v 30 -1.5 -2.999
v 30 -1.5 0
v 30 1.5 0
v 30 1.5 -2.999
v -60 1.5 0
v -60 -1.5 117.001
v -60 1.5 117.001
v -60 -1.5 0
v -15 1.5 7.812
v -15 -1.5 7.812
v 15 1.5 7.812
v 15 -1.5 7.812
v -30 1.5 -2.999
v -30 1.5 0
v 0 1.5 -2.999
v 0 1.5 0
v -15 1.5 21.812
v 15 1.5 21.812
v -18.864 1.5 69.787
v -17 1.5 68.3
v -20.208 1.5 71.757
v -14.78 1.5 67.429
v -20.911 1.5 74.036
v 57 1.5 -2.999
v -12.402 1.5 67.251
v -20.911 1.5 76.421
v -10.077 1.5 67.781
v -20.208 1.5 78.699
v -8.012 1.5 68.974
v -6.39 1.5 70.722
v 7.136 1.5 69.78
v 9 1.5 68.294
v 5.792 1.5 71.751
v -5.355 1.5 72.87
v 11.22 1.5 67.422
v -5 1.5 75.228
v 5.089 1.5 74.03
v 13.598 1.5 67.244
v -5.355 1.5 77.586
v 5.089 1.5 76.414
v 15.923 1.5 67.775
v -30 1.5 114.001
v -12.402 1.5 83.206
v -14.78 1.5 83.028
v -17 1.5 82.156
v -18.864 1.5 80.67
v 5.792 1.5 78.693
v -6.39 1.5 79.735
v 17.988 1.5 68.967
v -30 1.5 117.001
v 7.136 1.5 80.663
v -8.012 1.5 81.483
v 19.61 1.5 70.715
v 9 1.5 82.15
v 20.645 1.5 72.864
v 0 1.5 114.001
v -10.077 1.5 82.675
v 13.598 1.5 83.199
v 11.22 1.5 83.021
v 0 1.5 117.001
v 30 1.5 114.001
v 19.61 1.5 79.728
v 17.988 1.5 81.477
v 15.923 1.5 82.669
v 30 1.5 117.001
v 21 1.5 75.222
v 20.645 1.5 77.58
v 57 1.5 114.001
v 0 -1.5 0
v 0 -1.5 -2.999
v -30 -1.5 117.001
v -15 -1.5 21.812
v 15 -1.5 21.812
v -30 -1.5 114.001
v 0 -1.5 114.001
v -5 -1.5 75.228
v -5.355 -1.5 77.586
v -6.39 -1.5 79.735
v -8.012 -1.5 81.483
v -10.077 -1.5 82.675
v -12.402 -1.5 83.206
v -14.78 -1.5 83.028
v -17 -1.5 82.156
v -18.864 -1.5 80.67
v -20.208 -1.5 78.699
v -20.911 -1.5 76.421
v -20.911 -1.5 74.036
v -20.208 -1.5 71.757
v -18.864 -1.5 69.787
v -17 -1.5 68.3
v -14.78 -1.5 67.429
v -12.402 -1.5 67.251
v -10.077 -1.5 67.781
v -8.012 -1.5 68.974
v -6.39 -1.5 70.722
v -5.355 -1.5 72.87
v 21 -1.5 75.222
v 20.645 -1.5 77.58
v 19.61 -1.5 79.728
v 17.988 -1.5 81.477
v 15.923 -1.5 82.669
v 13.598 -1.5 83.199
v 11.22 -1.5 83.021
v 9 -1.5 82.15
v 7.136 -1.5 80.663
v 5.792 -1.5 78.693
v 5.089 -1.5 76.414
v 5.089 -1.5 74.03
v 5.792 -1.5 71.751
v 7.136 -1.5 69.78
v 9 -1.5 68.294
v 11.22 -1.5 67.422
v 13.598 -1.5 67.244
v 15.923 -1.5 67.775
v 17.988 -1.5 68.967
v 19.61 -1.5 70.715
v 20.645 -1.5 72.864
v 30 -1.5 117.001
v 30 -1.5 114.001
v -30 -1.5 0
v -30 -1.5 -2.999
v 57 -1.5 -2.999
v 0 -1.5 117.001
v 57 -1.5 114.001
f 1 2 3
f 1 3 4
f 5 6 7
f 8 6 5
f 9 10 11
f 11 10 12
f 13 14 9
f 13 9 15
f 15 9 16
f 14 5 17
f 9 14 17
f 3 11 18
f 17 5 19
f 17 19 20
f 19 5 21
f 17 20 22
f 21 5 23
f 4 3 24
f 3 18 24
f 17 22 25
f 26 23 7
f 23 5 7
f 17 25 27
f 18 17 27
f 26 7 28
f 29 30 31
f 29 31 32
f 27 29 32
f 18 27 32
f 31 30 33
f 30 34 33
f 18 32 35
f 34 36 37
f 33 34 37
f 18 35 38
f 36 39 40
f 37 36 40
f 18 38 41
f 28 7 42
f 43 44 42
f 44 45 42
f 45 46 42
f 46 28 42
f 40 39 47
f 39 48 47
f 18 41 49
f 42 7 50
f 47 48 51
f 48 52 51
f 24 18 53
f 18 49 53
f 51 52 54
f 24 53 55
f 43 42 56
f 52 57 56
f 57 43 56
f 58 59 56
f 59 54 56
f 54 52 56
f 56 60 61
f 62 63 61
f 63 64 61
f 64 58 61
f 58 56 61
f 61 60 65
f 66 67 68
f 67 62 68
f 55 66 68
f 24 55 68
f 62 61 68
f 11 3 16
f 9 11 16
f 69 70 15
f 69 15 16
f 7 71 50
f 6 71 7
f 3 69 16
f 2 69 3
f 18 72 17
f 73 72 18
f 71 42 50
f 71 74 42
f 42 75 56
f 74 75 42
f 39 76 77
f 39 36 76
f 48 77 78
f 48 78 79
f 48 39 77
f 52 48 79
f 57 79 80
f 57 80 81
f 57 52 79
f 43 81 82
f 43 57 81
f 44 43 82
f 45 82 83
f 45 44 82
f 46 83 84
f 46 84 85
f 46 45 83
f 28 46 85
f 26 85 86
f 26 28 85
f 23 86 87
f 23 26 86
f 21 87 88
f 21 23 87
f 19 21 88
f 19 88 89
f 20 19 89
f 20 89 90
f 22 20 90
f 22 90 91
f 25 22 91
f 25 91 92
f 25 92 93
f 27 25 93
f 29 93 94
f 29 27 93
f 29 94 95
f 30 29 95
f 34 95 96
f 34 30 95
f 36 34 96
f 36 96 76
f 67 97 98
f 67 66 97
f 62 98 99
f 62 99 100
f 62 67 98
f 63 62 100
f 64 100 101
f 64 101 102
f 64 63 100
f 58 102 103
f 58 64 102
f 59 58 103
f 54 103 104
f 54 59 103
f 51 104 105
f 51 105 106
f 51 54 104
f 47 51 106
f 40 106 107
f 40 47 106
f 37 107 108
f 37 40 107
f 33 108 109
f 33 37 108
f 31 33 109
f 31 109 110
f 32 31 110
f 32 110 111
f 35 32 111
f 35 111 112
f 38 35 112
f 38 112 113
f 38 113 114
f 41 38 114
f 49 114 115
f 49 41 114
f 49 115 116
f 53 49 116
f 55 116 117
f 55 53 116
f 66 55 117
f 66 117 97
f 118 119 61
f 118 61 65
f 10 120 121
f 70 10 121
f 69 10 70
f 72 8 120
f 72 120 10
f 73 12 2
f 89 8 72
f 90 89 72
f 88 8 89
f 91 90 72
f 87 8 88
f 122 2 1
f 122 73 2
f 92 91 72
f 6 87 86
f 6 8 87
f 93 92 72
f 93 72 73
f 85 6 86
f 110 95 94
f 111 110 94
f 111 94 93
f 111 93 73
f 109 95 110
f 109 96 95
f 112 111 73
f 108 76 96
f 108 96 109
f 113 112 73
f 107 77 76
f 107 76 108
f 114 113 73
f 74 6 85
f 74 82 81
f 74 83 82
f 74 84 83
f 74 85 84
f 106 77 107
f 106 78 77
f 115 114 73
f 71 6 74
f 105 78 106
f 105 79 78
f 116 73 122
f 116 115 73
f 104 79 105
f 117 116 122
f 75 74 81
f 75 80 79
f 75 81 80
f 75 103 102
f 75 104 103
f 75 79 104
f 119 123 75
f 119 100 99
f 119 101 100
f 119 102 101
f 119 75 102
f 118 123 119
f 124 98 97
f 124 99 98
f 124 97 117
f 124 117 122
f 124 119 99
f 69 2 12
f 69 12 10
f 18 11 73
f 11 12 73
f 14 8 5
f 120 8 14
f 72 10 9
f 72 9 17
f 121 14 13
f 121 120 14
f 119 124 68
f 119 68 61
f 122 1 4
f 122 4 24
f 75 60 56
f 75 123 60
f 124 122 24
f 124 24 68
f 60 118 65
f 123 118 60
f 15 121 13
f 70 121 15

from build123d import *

# Parameters (mm, degrees)
F0_W     = 30
F0_H     = 14
F0_R     = 8
F1_DEPTH = 1.5


# Not quite as in the source:
# - a feature names something its author has since deleted; it is built from what else it names


with BuildPart() as f1:
    # F0 (on Front) → F1 (new body, symmetric)
    with BuildSketch(Plane.XZ):
        Polygon((-30, -2.9994321861), (0, -2.9994321861), (0, 0), (30, 0), (30, -2.9994321861), (57, -2.9994321861), (57, 114.0005678139), (30, 114.0005678139), (30, 117.0005678139), (0, 117.0005678139), (0, 114.0005678139), (-30, 114.0005678139), (-30, 117.0005678139), (-60, 117.0005678139), (-60, 0), (-30, 0), align=None)
        with Locations((0, 14.8116284981)):
            Rectangle(F0_W, F0_H, mode=Mode.SUBTRACT)
        with Locations((-13, 75.2281695604)):
            Circle(F0_R, mode=Mode.SUBTRACT)
        with Locations((13, 75.2218647463)):
            Circle(F0_R, mode=Mode.SUBTRACT)
    extrude(amount=F1_DEPTH, both=True)


solid = f1.part
